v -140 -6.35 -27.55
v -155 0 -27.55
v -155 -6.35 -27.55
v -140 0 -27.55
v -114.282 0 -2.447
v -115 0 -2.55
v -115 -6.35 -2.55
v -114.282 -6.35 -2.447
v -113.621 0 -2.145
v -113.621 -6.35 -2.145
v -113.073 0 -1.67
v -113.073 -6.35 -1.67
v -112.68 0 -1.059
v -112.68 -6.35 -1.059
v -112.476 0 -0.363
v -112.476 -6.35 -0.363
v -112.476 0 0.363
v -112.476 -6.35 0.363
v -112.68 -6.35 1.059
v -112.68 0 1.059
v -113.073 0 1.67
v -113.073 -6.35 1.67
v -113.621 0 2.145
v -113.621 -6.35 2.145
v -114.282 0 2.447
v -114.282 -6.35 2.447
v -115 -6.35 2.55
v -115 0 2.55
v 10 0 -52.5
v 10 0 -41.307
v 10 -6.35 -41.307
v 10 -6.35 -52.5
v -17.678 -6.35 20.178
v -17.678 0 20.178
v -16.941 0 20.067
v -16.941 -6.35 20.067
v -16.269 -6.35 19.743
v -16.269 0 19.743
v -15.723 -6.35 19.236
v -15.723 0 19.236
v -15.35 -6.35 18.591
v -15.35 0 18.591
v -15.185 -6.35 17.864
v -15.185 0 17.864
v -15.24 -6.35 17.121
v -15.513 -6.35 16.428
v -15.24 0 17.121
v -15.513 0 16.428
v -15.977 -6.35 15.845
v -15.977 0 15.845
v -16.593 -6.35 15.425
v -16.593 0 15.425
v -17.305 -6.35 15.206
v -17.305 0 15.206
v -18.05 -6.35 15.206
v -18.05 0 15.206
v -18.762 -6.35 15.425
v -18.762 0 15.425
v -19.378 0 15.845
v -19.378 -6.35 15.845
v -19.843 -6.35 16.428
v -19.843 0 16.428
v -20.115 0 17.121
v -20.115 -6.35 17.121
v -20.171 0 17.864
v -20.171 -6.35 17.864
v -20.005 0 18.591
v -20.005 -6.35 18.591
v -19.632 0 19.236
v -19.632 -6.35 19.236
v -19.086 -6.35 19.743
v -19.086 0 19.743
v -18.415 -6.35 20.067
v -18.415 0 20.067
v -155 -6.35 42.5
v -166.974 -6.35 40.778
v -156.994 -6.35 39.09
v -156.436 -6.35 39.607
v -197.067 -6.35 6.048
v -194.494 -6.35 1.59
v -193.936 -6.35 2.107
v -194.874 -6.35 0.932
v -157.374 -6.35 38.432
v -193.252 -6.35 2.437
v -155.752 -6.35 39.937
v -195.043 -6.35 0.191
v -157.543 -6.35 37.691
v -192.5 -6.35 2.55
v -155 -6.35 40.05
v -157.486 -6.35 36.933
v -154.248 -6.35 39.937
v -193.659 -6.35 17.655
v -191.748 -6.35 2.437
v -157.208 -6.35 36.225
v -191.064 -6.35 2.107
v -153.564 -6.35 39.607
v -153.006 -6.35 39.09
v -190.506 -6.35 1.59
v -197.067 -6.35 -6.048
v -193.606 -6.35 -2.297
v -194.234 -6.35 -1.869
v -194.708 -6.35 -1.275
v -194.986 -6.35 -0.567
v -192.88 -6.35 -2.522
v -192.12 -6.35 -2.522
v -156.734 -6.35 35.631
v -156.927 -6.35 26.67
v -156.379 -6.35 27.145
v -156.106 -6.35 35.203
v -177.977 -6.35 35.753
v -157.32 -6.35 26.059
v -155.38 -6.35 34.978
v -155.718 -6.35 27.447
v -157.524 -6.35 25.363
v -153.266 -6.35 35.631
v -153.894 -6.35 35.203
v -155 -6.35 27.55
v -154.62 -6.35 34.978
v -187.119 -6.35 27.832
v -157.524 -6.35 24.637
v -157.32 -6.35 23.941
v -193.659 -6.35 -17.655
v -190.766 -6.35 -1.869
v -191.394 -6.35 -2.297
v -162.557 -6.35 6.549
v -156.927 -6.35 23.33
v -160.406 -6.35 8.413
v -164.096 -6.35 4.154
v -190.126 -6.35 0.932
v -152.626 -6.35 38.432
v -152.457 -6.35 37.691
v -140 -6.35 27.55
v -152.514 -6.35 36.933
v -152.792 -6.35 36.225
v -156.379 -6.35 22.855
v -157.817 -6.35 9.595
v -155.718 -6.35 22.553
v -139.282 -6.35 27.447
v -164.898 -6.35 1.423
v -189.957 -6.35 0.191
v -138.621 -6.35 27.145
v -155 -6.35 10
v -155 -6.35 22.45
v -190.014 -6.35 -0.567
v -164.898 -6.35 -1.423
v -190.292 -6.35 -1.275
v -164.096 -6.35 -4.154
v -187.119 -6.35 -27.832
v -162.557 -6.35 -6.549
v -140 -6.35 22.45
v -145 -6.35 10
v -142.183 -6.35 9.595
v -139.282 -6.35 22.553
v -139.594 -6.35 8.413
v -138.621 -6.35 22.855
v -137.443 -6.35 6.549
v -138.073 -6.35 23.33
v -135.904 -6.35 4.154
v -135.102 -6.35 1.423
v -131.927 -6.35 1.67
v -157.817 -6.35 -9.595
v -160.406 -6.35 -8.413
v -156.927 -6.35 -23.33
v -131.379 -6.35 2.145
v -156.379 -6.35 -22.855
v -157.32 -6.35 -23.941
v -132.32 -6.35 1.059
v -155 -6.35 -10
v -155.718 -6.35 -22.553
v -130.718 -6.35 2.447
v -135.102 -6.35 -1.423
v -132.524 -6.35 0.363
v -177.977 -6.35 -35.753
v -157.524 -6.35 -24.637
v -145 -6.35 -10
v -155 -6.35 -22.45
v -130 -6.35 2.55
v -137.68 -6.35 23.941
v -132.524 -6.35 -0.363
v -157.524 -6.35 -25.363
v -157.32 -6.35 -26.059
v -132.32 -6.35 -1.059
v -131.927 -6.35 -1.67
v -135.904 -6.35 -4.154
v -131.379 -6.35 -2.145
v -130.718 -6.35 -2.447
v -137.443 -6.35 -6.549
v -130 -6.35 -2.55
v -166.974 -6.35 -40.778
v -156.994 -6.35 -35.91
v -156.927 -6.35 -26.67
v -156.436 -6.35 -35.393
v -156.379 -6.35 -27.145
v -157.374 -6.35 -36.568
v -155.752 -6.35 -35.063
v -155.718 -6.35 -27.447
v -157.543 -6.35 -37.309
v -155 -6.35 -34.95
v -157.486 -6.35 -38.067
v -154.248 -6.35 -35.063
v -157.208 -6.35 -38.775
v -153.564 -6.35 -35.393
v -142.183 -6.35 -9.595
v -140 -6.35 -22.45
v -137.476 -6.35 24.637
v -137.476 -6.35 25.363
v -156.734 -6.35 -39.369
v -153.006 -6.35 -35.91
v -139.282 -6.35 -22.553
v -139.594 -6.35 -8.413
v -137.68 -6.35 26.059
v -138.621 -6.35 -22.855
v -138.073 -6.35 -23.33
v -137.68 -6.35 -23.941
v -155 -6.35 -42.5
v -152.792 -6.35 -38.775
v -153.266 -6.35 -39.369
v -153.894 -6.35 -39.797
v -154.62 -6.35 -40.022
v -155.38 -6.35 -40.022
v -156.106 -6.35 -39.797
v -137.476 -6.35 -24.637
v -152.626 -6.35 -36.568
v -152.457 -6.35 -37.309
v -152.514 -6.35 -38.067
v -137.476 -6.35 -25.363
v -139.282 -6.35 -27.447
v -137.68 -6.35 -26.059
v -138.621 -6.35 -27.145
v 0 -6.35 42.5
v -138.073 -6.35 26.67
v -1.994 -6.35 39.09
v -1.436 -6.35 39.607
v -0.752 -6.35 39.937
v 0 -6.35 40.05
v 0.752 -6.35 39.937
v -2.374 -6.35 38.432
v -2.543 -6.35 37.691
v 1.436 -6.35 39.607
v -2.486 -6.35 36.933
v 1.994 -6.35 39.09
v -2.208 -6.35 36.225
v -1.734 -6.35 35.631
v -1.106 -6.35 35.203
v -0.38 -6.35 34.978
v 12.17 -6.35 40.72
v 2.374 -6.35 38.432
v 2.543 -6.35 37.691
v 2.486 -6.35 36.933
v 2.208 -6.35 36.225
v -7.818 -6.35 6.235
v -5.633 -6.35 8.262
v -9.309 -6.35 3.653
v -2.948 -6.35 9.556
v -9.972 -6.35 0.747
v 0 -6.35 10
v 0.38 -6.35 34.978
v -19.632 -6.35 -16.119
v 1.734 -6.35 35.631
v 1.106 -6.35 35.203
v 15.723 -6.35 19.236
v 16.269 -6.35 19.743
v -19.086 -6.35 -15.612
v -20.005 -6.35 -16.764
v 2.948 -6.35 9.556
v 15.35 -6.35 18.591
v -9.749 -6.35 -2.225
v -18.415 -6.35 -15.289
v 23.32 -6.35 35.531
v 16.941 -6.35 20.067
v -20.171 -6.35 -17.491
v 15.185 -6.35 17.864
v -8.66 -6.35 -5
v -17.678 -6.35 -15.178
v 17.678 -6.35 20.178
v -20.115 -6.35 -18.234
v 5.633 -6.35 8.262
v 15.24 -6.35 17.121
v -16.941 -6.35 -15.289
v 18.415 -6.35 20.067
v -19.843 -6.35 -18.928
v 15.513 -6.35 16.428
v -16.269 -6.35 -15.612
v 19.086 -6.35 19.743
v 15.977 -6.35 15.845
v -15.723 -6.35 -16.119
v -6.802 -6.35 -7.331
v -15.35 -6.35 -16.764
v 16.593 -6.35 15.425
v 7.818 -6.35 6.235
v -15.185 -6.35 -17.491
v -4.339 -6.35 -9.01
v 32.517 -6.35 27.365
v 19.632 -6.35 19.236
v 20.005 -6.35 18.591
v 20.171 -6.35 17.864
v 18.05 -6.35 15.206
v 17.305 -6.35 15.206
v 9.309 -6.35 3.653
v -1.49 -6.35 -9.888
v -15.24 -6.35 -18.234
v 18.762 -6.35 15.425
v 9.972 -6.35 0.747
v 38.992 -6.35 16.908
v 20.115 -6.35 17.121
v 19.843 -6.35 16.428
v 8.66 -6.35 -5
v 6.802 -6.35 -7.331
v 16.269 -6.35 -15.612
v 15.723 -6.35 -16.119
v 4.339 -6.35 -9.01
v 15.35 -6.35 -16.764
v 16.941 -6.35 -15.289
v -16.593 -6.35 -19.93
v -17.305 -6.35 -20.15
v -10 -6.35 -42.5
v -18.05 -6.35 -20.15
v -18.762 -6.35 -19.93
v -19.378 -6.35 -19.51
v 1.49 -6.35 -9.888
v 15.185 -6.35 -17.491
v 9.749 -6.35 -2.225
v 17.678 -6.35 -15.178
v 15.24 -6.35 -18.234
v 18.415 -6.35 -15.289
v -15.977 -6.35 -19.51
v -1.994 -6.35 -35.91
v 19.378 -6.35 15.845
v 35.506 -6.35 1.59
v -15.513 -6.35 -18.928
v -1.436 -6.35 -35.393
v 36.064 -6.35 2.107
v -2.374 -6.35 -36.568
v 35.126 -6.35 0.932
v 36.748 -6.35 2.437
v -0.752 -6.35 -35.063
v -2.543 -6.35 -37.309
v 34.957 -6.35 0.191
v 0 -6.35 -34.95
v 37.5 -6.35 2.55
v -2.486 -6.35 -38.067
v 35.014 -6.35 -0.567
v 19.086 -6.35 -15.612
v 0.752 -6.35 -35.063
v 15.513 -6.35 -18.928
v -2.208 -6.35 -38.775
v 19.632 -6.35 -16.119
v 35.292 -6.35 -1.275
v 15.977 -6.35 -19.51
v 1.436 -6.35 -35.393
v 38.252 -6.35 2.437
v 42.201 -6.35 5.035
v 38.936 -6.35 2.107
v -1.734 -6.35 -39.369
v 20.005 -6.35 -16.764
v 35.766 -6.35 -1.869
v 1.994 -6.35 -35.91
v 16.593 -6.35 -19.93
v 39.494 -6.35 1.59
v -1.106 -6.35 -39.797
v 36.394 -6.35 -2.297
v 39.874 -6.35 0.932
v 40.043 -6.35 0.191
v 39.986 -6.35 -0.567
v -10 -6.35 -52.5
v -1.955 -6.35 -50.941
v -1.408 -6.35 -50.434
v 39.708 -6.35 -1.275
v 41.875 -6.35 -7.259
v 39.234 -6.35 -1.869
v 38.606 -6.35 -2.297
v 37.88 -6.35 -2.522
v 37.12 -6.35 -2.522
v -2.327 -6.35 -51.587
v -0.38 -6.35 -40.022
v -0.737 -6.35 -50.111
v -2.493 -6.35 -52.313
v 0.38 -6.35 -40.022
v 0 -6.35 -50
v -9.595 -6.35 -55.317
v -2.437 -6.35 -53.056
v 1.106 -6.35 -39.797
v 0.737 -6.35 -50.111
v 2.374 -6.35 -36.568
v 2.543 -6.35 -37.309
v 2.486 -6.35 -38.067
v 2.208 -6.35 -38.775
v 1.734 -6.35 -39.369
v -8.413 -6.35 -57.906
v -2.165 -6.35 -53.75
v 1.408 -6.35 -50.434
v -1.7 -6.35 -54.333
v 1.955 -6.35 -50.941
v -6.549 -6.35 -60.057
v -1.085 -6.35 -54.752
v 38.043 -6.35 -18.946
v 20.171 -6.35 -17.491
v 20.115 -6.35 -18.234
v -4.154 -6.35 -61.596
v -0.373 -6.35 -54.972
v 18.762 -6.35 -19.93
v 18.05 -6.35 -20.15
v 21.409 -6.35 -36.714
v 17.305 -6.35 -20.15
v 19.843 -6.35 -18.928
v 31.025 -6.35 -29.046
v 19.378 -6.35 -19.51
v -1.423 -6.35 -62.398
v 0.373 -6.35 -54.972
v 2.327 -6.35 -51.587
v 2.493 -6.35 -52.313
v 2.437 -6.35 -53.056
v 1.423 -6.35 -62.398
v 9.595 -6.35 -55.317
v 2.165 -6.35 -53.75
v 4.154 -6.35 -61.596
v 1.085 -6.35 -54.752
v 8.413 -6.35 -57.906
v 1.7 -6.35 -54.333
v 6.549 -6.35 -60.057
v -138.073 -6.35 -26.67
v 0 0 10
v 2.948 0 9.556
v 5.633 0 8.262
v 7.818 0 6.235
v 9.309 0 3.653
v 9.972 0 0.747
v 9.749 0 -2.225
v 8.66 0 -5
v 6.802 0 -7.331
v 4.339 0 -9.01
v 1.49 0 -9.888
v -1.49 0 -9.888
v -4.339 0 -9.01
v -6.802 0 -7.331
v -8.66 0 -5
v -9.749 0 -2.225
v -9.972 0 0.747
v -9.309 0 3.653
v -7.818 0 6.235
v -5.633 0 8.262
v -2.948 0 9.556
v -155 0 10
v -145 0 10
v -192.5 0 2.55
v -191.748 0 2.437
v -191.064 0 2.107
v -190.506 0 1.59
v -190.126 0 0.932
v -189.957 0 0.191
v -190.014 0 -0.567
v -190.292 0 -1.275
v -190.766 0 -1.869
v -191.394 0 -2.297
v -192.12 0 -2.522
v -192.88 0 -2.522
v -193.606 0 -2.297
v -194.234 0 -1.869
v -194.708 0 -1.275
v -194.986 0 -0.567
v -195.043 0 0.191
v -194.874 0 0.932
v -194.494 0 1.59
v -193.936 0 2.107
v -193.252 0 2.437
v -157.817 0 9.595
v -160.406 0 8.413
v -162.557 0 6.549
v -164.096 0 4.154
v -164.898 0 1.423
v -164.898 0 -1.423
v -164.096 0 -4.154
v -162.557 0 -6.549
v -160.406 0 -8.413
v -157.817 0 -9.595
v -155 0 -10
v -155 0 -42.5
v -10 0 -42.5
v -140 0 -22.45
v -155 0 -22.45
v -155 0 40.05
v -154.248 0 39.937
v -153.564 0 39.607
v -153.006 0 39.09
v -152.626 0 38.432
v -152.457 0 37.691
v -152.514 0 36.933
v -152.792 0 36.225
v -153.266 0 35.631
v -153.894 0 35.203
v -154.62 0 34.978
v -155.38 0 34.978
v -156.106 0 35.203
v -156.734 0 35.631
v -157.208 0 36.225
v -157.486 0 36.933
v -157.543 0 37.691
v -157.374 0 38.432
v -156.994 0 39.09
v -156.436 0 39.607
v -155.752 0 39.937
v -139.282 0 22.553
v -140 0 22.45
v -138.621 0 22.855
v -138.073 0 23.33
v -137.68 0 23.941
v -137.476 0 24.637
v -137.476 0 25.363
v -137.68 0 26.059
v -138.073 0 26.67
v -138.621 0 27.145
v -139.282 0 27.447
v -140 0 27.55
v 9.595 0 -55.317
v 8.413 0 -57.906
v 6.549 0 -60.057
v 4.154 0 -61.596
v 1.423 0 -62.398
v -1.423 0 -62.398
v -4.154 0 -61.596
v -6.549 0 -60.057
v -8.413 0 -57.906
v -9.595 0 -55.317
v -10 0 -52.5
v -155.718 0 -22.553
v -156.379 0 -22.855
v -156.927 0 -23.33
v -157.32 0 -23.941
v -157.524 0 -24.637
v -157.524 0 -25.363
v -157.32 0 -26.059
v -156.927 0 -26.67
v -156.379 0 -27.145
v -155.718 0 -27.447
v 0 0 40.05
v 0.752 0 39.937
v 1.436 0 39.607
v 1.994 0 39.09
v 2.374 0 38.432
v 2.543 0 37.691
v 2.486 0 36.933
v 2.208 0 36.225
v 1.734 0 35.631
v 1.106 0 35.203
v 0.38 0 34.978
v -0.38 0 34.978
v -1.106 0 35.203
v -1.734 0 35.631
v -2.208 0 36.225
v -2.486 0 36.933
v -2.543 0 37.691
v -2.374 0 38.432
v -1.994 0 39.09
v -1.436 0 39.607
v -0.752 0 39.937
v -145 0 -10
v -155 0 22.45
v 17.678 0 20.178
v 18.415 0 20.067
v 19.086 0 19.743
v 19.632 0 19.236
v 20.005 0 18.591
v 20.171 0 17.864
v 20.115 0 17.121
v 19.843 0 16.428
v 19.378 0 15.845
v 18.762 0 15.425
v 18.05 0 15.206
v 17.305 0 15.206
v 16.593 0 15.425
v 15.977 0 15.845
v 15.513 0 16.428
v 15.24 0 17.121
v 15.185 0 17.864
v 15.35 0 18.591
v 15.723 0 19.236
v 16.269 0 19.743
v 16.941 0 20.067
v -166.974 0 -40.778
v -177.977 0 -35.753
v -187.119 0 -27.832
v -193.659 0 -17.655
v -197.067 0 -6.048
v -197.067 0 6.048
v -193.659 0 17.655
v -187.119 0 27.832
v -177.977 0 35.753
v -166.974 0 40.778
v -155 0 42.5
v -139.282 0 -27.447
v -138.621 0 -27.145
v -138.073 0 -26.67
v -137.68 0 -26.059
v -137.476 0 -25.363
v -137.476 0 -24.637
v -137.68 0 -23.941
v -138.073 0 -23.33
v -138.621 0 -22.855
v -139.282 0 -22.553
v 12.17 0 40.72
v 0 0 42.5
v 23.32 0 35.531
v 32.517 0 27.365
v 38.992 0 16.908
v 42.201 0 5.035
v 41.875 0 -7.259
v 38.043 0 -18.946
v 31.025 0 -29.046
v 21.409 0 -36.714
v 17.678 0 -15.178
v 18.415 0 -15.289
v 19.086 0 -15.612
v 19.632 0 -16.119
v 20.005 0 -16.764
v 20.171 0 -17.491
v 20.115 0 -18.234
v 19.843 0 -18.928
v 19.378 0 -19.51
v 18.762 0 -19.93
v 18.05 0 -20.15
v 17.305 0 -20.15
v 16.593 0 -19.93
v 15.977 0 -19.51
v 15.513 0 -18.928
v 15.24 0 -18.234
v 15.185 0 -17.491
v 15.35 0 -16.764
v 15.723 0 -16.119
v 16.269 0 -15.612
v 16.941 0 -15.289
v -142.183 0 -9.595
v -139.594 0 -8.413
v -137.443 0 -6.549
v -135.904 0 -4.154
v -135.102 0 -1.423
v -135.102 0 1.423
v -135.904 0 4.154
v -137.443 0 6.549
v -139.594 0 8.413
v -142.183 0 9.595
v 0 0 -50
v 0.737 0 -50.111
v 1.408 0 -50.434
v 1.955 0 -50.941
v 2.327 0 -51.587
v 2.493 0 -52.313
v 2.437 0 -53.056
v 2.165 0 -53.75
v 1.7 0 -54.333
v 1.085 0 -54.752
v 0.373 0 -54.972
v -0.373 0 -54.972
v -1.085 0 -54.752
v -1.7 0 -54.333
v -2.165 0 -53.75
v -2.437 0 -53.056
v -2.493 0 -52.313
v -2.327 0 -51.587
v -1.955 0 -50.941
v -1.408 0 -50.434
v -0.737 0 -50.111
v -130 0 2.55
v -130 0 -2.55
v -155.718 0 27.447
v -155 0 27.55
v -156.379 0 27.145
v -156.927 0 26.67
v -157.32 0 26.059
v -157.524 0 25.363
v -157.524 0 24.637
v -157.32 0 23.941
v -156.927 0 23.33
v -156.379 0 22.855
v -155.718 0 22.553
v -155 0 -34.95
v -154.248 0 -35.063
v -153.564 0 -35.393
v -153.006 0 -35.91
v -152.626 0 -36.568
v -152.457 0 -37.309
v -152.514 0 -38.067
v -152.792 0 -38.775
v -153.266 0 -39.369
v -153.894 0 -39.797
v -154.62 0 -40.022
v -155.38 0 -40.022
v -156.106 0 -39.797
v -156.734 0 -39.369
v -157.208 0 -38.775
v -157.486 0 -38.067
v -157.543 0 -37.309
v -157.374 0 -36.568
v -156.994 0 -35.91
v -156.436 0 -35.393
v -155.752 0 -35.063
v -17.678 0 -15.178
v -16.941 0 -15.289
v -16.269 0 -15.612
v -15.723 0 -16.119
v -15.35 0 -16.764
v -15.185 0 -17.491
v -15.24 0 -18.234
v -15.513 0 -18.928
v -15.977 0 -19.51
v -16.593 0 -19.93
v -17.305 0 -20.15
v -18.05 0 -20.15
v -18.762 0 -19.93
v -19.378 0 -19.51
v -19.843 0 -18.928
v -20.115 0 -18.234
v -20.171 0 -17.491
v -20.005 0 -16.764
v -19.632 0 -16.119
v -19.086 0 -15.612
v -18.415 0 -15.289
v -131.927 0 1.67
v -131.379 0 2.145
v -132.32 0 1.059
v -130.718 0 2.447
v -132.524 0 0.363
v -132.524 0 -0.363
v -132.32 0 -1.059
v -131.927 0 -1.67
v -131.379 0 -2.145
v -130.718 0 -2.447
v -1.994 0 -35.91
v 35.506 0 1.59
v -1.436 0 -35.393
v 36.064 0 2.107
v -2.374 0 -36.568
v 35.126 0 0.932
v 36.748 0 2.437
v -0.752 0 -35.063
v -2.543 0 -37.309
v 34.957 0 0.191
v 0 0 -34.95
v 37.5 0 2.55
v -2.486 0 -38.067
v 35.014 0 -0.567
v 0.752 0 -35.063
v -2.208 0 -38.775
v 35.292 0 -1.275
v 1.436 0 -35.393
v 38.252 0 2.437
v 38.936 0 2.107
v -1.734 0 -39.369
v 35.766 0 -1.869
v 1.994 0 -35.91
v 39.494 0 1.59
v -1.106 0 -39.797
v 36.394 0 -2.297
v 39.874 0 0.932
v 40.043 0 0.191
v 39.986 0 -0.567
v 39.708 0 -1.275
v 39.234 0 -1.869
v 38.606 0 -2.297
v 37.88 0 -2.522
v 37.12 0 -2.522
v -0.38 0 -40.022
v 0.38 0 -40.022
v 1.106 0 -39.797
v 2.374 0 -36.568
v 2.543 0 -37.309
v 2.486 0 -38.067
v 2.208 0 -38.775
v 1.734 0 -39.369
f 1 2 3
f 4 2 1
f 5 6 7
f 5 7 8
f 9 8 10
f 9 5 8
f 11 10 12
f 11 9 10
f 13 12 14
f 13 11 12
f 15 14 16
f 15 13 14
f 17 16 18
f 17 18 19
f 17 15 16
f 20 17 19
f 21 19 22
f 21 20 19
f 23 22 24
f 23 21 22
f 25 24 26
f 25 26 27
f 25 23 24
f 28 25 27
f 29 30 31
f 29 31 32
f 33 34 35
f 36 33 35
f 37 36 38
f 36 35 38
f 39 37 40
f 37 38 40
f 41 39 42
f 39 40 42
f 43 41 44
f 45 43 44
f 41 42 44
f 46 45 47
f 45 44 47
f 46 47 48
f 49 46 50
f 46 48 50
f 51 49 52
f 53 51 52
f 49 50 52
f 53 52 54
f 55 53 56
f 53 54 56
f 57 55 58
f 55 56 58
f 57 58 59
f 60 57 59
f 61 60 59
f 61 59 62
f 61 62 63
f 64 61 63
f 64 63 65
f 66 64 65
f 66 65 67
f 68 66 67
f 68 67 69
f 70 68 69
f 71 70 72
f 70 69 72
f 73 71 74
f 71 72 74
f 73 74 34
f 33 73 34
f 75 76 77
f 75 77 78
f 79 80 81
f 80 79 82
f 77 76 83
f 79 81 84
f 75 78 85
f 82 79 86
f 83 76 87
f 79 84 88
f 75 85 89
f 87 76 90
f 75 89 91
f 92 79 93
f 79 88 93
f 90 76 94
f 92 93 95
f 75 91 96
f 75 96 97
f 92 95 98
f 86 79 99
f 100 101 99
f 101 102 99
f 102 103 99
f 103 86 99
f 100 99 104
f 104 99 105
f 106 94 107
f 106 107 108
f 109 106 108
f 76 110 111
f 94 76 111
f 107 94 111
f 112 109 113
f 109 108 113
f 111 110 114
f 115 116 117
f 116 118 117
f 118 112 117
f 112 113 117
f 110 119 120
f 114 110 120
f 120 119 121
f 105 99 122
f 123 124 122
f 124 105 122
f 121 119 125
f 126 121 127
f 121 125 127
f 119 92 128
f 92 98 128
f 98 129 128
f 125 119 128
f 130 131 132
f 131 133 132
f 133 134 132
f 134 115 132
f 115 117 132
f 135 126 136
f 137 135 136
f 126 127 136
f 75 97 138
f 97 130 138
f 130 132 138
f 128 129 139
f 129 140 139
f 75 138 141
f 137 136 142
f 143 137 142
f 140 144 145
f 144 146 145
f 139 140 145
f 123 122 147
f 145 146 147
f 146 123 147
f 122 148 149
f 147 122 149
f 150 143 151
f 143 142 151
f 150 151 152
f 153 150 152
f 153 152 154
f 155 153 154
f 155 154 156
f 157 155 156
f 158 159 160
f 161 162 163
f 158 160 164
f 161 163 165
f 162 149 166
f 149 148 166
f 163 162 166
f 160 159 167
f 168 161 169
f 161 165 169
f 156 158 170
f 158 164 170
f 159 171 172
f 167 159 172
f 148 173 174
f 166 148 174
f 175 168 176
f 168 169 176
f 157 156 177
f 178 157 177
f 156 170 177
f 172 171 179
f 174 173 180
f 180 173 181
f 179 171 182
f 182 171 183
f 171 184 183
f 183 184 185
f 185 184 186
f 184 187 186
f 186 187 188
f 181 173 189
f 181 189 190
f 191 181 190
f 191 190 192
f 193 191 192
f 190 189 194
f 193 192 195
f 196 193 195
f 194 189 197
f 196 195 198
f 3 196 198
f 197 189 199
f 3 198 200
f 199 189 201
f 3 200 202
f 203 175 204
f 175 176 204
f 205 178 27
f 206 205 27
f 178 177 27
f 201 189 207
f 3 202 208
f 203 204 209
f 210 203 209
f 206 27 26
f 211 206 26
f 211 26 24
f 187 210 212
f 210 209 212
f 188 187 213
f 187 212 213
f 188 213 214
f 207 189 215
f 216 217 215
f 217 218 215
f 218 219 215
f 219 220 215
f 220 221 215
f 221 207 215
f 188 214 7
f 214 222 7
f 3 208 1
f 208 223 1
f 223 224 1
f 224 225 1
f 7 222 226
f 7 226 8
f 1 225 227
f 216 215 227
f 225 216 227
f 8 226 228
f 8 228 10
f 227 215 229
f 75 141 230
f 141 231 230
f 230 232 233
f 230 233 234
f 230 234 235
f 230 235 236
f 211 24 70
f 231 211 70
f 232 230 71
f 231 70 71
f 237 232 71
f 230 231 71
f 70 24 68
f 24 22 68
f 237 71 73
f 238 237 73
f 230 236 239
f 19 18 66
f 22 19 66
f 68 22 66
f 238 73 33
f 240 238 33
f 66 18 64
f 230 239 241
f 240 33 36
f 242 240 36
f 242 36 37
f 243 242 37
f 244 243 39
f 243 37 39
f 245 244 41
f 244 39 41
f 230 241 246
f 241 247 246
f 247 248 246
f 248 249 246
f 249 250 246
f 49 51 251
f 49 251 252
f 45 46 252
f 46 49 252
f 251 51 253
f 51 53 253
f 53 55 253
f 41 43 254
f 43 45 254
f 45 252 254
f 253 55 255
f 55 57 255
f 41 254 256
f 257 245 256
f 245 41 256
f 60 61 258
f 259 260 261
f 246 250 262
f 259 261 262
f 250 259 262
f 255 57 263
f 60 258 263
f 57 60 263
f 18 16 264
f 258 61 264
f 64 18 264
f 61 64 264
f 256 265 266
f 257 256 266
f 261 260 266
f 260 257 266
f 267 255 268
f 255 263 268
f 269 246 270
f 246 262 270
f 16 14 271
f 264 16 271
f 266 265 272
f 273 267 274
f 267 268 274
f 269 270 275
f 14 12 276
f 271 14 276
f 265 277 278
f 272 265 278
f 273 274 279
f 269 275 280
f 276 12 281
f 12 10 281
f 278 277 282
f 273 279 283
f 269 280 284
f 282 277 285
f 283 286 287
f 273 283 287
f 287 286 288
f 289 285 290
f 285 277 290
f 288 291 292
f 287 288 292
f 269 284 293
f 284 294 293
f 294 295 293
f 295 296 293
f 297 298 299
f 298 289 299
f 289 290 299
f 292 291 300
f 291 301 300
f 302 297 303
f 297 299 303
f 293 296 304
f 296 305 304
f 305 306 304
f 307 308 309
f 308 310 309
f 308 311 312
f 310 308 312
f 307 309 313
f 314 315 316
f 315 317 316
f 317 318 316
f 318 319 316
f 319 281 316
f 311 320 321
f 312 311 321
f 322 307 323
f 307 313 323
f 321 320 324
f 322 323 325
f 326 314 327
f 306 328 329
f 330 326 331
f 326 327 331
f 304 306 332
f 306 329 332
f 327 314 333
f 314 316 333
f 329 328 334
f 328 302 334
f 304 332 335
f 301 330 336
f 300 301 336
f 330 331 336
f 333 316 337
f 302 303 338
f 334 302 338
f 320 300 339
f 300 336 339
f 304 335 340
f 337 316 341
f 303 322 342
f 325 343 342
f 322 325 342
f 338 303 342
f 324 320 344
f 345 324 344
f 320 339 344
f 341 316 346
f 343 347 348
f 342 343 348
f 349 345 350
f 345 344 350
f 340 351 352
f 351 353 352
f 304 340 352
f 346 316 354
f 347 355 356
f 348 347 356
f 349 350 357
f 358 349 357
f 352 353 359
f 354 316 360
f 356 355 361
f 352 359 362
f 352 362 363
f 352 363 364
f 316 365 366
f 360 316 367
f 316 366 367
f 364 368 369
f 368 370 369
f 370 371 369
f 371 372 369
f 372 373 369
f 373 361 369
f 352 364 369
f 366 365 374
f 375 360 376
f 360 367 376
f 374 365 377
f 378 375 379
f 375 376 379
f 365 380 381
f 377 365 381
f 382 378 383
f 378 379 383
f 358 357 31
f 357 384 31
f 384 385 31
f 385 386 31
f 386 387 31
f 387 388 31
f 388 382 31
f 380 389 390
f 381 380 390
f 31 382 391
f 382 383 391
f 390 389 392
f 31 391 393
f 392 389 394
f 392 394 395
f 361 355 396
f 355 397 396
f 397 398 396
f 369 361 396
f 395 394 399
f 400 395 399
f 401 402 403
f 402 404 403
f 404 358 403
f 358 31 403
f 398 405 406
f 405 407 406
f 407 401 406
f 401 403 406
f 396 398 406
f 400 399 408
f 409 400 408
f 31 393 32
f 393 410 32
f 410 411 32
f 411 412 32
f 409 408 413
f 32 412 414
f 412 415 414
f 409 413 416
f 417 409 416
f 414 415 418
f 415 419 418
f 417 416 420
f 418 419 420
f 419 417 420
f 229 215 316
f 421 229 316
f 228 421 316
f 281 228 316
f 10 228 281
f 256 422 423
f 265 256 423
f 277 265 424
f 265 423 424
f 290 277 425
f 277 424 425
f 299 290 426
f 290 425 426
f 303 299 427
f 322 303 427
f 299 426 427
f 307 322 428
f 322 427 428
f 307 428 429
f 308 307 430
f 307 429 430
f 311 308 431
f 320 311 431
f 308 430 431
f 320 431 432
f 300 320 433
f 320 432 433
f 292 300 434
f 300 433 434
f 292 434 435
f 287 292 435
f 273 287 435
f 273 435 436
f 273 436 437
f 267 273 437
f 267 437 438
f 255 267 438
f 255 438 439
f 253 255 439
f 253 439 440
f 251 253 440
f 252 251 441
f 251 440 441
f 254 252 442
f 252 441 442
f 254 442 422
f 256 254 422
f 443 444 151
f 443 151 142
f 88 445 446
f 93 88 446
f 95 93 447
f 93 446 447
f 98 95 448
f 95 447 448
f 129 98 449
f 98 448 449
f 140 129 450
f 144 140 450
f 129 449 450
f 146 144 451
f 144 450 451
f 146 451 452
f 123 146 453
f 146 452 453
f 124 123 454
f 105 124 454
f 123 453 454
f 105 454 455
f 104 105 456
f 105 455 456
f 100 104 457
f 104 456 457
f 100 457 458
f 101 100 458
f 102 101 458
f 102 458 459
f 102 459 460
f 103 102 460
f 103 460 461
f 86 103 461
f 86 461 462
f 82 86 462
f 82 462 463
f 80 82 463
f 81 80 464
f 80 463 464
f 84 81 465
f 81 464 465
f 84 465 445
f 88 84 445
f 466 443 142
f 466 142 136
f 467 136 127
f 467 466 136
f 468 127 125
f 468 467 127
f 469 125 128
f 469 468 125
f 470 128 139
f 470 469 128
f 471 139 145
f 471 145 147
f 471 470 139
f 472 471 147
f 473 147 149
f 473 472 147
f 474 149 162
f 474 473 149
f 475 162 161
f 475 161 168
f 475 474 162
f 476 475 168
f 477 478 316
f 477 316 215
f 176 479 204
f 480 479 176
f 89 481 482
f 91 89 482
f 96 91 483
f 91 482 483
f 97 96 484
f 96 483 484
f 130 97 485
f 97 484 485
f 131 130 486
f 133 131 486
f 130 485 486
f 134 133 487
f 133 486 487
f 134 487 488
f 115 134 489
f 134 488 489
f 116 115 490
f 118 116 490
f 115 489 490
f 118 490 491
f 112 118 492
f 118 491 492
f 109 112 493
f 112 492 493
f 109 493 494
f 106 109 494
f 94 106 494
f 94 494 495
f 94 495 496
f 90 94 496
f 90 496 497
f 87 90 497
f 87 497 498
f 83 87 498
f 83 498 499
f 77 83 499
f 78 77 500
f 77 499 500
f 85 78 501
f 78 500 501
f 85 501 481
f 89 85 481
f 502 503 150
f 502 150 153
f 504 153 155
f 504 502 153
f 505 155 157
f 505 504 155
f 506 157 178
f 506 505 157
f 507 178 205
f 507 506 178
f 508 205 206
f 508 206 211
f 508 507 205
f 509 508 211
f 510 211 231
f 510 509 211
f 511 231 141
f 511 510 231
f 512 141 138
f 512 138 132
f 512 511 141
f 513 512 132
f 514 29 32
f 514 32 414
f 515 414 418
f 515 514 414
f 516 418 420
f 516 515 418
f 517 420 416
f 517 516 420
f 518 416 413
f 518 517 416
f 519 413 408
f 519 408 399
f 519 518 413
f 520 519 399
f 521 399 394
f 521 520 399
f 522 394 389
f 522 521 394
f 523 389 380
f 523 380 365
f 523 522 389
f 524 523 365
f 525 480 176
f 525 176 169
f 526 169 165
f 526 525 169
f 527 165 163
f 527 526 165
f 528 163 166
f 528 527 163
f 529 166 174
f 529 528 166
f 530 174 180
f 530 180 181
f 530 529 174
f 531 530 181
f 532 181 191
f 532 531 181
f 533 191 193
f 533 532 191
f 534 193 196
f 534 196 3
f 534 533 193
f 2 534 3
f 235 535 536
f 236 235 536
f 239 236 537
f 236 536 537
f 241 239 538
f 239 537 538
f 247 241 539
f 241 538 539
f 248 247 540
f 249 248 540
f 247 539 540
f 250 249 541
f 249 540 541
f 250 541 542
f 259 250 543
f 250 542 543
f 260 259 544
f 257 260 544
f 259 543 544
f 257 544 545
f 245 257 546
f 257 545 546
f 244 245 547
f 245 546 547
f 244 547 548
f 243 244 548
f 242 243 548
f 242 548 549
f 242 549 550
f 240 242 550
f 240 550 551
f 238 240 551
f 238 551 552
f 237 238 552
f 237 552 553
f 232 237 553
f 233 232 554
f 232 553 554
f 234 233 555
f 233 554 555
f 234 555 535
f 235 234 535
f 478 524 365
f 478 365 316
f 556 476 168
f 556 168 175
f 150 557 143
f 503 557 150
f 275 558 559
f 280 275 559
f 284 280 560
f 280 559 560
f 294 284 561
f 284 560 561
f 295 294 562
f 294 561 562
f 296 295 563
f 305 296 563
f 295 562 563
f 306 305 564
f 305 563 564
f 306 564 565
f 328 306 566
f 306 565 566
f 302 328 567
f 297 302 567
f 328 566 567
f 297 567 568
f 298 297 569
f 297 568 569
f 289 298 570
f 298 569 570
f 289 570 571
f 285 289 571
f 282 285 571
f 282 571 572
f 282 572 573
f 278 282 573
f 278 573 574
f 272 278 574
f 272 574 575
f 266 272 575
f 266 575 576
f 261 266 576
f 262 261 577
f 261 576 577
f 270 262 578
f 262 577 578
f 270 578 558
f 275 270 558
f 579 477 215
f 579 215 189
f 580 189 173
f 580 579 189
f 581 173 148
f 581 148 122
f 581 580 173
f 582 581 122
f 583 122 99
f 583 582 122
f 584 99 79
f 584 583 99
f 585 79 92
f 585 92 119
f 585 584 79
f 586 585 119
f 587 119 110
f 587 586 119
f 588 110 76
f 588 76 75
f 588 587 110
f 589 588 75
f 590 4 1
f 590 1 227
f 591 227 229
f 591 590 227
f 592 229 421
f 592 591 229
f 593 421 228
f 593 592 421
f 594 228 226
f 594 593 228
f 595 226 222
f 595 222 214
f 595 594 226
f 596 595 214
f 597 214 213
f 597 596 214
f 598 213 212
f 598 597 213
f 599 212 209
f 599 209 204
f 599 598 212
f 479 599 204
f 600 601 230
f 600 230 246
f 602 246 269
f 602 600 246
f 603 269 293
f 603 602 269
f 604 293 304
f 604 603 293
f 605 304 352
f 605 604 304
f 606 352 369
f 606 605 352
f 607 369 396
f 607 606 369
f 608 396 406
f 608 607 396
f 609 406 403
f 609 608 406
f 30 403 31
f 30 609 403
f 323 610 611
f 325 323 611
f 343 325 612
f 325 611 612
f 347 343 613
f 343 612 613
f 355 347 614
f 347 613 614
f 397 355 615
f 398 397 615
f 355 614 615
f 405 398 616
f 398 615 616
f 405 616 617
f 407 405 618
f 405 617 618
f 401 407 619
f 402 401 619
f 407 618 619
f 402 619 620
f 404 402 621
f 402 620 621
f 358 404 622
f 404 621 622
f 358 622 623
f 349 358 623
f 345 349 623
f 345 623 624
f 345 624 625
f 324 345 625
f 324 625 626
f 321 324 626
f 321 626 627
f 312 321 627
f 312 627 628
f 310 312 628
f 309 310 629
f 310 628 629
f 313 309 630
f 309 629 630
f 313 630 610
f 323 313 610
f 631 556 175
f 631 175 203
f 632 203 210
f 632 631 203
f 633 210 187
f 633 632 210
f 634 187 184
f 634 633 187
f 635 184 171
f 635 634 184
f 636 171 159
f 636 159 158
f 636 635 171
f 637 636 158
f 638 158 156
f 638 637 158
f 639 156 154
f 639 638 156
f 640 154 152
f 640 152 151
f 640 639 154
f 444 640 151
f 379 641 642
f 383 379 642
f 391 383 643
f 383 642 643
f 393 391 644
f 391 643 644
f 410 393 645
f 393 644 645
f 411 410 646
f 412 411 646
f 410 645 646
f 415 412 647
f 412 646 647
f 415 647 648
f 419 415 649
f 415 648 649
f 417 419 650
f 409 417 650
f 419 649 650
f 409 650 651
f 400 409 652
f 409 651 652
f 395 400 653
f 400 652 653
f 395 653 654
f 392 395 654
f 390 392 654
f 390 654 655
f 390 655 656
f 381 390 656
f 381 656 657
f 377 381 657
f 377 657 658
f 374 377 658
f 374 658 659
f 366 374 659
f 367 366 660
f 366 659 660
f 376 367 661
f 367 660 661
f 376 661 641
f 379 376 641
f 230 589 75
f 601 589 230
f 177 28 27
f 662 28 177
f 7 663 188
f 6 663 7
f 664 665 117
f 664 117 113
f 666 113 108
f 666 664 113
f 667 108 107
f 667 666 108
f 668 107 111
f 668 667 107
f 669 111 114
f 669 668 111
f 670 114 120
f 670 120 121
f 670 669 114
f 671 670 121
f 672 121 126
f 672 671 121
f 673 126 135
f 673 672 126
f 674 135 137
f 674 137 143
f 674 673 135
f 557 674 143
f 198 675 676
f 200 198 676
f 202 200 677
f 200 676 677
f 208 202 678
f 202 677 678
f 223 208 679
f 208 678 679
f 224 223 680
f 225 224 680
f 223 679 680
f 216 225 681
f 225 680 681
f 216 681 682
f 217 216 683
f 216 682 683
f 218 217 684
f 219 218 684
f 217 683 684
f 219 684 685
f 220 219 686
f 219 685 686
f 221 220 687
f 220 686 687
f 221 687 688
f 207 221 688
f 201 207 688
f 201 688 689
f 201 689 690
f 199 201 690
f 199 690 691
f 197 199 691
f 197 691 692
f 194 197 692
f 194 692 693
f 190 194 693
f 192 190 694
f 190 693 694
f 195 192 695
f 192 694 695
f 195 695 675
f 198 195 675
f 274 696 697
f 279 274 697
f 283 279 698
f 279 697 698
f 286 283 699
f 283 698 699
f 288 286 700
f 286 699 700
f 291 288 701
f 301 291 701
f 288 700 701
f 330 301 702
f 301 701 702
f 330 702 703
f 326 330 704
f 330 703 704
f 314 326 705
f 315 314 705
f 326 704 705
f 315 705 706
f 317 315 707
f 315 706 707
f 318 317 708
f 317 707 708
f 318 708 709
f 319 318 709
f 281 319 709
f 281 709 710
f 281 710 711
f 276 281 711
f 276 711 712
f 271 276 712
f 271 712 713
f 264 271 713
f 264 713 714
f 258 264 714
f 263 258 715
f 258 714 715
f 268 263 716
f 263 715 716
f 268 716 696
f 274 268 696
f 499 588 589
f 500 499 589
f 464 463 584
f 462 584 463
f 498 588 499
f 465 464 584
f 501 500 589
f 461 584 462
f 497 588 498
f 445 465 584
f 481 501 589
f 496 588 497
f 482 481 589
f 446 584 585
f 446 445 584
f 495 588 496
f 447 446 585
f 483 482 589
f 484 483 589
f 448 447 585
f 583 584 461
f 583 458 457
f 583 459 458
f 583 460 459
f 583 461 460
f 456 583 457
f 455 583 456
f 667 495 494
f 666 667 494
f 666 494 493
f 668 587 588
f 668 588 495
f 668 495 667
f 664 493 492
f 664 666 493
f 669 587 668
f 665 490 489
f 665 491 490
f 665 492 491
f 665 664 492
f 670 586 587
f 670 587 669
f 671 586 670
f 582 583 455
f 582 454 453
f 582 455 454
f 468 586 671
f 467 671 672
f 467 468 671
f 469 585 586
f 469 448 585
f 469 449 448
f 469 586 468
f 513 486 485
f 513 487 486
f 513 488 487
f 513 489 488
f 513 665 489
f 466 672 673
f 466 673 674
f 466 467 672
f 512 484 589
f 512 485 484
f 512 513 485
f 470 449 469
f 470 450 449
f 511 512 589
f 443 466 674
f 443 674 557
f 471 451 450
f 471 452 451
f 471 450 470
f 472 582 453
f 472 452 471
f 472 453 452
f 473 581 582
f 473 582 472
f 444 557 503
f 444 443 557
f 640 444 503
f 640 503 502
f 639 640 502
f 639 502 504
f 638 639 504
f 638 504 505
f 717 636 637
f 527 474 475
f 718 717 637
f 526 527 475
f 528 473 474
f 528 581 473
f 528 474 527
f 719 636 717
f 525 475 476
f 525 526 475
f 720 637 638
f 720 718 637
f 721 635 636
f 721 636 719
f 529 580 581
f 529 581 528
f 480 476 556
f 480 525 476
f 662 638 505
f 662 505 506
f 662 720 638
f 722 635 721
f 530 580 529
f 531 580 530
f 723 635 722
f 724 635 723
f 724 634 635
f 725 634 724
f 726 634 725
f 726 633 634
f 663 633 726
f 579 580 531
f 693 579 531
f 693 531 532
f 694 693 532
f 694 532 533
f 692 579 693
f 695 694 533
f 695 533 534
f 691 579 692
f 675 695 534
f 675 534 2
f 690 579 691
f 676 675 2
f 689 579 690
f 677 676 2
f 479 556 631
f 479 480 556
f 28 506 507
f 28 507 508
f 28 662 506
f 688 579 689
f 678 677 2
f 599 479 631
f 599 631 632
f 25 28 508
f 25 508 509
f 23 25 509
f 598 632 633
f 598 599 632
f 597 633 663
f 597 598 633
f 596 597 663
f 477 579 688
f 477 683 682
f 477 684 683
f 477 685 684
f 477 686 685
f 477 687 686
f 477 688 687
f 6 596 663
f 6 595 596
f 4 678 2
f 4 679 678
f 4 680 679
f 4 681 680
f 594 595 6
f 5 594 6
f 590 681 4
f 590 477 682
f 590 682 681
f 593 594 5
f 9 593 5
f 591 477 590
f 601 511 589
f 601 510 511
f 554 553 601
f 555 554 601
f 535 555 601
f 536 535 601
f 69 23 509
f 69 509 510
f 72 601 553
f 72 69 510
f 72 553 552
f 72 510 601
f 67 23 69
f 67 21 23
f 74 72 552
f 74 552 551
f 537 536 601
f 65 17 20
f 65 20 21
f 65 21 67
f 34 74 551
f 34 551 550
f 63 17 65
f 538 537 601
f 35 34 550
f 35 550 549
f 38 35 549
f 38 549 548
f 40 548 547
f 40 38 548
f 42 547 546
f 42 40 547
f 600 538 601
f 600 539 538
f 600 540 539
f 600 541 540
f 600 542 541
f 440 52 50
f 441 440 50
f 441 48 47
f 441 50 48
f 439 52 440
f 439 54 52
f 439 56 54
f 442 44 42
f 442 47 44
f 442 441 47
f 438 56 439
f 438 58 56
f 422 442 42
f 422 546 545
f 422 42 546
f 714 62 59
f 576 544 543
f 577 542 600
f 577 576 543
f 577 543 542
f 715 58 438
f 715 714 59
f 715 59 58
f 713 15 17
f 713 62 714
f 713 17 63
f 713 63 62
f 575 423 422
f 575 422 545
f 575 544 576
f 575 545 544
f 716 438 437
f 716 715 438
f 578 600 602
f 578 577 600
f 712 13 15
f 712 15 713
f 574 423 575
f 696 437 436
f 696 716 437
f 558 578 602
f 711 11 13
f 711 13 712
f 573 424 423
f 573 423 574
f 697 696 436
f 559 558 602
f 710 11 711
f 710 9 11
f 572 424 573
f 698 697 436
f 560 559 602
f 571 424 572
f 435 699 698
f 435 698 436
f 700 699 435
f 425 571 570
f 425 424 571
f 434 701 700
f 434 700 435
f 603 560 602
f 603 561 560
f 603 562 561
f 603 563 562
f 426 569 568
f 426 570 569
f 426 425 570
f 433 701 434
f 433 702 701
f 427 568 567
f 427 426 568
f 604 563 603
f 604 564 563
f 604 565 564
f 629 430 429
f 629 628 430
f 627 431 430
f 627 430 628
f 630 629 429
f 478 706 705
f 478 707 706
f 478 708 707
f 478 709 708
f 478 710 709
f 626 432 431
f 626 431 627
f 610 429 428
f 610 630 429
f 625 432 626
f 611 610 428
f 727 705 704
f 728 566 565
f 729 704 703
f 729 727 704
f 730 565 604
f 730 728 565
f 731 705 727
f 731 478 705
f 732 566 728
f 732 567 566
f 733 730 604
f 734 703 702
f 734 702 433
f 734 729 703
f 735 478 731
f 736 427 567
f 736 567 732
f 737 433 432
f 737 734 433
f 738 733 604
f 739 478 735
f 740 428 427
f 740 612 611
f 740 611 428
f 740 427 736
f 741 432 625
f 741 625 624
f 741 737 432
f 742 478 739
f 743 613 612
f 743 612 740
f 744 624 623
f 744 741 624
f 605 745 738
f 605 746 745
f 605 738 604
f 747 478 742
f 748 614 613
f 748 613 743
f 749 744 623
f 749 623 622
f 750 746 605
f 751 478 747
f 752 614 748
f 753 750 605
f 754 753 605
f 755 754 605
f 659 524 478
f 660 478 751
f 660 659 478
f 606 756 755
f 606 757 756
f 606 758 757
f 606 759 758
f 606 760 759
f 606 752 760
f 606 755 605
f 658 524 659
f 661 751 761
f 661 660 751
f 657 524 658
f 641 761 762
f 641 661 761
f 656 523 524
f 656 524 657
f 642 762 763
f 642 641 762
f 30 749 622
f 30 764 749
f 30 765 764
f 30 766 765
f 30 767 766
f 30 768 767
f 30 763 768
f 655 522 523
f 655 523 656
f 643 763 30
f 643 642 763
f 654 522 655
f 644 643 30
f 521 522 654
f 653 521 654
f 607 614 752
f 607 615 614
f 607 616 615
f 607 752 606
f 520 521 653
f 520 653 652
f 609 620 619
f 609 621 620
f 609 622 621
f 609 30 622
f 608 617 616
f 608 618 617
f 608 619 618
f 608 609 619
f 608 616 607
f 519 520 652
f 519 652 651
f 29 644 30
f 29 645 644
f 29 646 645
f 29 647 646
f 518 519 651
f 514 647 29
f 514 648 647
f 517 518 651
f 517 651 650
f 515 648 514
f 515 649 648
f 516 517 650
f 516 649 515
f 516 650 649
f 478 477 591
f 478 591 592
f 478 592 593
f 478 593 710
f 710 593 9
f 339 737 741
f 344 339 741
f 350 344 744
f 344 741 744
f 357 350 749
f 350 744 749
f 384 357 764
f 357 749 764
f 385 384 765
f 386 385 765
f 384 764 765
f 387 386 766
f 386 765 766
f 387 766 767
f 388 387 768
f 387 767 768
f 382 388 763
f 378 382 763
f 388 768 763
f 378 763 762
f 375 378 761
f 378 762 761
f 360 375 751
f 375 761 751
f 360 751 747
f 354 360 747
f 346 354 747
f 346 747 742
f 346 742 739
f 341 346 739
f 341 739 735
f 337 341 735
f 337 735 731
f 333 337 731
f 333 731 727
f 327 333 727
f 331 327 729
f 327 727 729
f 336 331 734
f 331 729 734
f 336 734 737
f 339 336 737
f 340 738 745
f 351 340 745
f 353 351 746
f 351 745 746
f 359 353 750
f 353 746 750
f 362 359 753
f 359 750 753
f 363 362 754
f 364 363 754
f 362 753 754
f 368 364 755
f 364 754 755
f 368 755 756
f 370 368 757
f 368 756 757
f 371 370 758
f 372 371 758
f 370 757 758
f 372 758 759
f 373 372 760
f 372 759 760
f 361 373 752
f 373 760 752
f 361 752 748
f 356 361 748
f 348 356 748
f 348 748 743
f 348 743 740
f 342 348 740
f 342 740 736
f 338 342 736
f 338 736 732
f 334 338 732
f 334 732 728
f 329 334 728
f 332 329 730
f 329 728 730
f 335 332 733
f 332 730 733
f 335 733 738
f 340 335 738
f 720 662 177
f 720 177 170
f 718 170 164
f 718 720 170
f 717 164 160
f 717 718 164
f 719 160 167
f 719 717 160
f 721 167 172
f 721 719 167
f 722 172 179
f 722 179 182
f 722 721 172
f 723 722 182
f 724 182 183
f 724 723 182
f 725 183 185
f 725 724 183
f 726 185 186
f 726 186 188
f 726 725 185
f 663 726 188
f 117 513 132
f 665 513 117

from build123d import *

# Parameters (mm, degrees)
SKETCH1_R           = 2.55
SKETCH1_R_2         = 2.5
SKETCH1_R_3         = 10
BOSS_EXTRUDE1_DEPTH = 6.35


with BuildPart() as part:
    # Sketch1 → Boss-Extrude1 (new body)
    with BuildSketch(Plane(origin=(0, 0, 0), x_dir=(1, 0, 0), z_dir=(0, 1, 0))):
        with BuildLine():
            ThreePointArc((-155, 42.5), (-197.5, 0), (-155, -42.5))
            Line((-155, -42.5), (0, -42.5))
            ThreePointArc((0, -42.5), (42.200640469, -5.0354686), (10, 41.306779105))
            Line((10, 41.306779105), (10, 52.5))
            ThreePointArc((10, 52.5), (0, 62.5), (-10, 52.5))
            Line((-10, 52.5), (-10, 42.5))
            Line((-10, 42.5), (-155, 42.5))
        make_face()
        with BuildLine():
            ThreePointArc((-115, 2.55), (-112.45, 0), (-115, -2.55))
            Line((-115, -2.55), (-130, -2.55))
            ThreePointArc((-130, -2.55), (-132.55, 0), (-130, 2.55))
            Line((-130, 2.55), (-115, 2.55))
        make_face(mode=Mode.SUBTRACT)
        with Locations(Location((-155, -37.5, 0), (0, 0, 270))):
            Circle(SKETCH1_R, mode=Mode.SUBTRACT)
        with BuildLine():
            ThreePointArc((-155, -27.55), (-157.55, -25), (-155, -22.45))
            Line((-155, -22.45), (-140, -22.45))
            ThreePointArc((-140, -22.45), (-137.45, -25), (-140, -27.55))
            Line((-140, -27.55), (-155, -27.55))
        make_face(mode=Mode.SUBTRACT)
        with Locations(Location((-192.5, 0, 0), (0, 0, 270))):
            Circle(SKETCH1_R, mode=Mode.SUBTRACT)
        with BuildLine():
            ThreePointArc((-155, -10), (-165, 0), (-155, 10))
            Line((-155, 10), (-145, 10))
            ThreePointArc((-145, 10), (-135, 0), (-145, -10))
            Line((-145, -10), (-155, -10))
        make_face(mode=Mode.SUBTRACT)
        with BuildLine():
            ThreePointArc((-155, 22.45), (-157.55, 25), (-155, 27.55))
            Line((-155, 27.55), (-140, 27.55))
            ThreePointArc((-140, 27.55), (-137.45, 25), (-140, 22.45))
            Line((-140, 22.45), (-155, 22.45))
        make_face(mode=Mode.SUBTRACT)
        with Locations(Location((-155, 37.5, 0), (0, 0, 270))):
            Circle(SKETCH1_R, mode=Mode.SUBTRACT)
        with Locations(Location((0, 37.5, 0), (0, 0, 270))):
            Circle(SKETCH1_R, mode=Mode.SUBTRACT)
        with Locations(Location((17.67766953, 17.67766953, 0), (0, 0, 270))):
            Circle(SKETCH1_R_2, mode=Mode.SUBTRACT)
        with Locations(Location((-17.67766953, -17.67766953, 0), (0, 0, 270))):
            Circle(SKETCH1_R_2, mode=Mode.SUBTRACT)
        with Locations(Location((0, -37.5, 0), (0, 0, 270))):
            Circle(SKETCH1_R, mode=Mode.SUBTRACT)
        with Locations(Location((17.67766953, -17.67766953, 0), (0, 0, 270))):
            Circle(SKETCH1_R_2, mode=Mode.SUBTRACT)
        with Locations(Location((0, 0, 0), (0, 0, 270))):
            Circle(SKETCH1_R_3, mode=Mode.SUBTRACT)
        with Locations(Location((37.5, 0, 0), (0, 0, 270))):
            Circle(SKETCH1_R, mode=Mode.SUBTRACT)
        with Locations(Location((-17.67766953, 17.67766953, 0), (0, 0, 270))):
            Circle(SKETCH1_R_2, mode=Mode.SUBTRACT)
        with Locations(Location((0, 52.5, 0), (0, 0, 270))):
            Circle(SKETCH1_R_2, mode=Mode.SUBTRACT)
    extrude(amount=-BOSS_EXTRUDE1_DEPTH)


solid = part.part
